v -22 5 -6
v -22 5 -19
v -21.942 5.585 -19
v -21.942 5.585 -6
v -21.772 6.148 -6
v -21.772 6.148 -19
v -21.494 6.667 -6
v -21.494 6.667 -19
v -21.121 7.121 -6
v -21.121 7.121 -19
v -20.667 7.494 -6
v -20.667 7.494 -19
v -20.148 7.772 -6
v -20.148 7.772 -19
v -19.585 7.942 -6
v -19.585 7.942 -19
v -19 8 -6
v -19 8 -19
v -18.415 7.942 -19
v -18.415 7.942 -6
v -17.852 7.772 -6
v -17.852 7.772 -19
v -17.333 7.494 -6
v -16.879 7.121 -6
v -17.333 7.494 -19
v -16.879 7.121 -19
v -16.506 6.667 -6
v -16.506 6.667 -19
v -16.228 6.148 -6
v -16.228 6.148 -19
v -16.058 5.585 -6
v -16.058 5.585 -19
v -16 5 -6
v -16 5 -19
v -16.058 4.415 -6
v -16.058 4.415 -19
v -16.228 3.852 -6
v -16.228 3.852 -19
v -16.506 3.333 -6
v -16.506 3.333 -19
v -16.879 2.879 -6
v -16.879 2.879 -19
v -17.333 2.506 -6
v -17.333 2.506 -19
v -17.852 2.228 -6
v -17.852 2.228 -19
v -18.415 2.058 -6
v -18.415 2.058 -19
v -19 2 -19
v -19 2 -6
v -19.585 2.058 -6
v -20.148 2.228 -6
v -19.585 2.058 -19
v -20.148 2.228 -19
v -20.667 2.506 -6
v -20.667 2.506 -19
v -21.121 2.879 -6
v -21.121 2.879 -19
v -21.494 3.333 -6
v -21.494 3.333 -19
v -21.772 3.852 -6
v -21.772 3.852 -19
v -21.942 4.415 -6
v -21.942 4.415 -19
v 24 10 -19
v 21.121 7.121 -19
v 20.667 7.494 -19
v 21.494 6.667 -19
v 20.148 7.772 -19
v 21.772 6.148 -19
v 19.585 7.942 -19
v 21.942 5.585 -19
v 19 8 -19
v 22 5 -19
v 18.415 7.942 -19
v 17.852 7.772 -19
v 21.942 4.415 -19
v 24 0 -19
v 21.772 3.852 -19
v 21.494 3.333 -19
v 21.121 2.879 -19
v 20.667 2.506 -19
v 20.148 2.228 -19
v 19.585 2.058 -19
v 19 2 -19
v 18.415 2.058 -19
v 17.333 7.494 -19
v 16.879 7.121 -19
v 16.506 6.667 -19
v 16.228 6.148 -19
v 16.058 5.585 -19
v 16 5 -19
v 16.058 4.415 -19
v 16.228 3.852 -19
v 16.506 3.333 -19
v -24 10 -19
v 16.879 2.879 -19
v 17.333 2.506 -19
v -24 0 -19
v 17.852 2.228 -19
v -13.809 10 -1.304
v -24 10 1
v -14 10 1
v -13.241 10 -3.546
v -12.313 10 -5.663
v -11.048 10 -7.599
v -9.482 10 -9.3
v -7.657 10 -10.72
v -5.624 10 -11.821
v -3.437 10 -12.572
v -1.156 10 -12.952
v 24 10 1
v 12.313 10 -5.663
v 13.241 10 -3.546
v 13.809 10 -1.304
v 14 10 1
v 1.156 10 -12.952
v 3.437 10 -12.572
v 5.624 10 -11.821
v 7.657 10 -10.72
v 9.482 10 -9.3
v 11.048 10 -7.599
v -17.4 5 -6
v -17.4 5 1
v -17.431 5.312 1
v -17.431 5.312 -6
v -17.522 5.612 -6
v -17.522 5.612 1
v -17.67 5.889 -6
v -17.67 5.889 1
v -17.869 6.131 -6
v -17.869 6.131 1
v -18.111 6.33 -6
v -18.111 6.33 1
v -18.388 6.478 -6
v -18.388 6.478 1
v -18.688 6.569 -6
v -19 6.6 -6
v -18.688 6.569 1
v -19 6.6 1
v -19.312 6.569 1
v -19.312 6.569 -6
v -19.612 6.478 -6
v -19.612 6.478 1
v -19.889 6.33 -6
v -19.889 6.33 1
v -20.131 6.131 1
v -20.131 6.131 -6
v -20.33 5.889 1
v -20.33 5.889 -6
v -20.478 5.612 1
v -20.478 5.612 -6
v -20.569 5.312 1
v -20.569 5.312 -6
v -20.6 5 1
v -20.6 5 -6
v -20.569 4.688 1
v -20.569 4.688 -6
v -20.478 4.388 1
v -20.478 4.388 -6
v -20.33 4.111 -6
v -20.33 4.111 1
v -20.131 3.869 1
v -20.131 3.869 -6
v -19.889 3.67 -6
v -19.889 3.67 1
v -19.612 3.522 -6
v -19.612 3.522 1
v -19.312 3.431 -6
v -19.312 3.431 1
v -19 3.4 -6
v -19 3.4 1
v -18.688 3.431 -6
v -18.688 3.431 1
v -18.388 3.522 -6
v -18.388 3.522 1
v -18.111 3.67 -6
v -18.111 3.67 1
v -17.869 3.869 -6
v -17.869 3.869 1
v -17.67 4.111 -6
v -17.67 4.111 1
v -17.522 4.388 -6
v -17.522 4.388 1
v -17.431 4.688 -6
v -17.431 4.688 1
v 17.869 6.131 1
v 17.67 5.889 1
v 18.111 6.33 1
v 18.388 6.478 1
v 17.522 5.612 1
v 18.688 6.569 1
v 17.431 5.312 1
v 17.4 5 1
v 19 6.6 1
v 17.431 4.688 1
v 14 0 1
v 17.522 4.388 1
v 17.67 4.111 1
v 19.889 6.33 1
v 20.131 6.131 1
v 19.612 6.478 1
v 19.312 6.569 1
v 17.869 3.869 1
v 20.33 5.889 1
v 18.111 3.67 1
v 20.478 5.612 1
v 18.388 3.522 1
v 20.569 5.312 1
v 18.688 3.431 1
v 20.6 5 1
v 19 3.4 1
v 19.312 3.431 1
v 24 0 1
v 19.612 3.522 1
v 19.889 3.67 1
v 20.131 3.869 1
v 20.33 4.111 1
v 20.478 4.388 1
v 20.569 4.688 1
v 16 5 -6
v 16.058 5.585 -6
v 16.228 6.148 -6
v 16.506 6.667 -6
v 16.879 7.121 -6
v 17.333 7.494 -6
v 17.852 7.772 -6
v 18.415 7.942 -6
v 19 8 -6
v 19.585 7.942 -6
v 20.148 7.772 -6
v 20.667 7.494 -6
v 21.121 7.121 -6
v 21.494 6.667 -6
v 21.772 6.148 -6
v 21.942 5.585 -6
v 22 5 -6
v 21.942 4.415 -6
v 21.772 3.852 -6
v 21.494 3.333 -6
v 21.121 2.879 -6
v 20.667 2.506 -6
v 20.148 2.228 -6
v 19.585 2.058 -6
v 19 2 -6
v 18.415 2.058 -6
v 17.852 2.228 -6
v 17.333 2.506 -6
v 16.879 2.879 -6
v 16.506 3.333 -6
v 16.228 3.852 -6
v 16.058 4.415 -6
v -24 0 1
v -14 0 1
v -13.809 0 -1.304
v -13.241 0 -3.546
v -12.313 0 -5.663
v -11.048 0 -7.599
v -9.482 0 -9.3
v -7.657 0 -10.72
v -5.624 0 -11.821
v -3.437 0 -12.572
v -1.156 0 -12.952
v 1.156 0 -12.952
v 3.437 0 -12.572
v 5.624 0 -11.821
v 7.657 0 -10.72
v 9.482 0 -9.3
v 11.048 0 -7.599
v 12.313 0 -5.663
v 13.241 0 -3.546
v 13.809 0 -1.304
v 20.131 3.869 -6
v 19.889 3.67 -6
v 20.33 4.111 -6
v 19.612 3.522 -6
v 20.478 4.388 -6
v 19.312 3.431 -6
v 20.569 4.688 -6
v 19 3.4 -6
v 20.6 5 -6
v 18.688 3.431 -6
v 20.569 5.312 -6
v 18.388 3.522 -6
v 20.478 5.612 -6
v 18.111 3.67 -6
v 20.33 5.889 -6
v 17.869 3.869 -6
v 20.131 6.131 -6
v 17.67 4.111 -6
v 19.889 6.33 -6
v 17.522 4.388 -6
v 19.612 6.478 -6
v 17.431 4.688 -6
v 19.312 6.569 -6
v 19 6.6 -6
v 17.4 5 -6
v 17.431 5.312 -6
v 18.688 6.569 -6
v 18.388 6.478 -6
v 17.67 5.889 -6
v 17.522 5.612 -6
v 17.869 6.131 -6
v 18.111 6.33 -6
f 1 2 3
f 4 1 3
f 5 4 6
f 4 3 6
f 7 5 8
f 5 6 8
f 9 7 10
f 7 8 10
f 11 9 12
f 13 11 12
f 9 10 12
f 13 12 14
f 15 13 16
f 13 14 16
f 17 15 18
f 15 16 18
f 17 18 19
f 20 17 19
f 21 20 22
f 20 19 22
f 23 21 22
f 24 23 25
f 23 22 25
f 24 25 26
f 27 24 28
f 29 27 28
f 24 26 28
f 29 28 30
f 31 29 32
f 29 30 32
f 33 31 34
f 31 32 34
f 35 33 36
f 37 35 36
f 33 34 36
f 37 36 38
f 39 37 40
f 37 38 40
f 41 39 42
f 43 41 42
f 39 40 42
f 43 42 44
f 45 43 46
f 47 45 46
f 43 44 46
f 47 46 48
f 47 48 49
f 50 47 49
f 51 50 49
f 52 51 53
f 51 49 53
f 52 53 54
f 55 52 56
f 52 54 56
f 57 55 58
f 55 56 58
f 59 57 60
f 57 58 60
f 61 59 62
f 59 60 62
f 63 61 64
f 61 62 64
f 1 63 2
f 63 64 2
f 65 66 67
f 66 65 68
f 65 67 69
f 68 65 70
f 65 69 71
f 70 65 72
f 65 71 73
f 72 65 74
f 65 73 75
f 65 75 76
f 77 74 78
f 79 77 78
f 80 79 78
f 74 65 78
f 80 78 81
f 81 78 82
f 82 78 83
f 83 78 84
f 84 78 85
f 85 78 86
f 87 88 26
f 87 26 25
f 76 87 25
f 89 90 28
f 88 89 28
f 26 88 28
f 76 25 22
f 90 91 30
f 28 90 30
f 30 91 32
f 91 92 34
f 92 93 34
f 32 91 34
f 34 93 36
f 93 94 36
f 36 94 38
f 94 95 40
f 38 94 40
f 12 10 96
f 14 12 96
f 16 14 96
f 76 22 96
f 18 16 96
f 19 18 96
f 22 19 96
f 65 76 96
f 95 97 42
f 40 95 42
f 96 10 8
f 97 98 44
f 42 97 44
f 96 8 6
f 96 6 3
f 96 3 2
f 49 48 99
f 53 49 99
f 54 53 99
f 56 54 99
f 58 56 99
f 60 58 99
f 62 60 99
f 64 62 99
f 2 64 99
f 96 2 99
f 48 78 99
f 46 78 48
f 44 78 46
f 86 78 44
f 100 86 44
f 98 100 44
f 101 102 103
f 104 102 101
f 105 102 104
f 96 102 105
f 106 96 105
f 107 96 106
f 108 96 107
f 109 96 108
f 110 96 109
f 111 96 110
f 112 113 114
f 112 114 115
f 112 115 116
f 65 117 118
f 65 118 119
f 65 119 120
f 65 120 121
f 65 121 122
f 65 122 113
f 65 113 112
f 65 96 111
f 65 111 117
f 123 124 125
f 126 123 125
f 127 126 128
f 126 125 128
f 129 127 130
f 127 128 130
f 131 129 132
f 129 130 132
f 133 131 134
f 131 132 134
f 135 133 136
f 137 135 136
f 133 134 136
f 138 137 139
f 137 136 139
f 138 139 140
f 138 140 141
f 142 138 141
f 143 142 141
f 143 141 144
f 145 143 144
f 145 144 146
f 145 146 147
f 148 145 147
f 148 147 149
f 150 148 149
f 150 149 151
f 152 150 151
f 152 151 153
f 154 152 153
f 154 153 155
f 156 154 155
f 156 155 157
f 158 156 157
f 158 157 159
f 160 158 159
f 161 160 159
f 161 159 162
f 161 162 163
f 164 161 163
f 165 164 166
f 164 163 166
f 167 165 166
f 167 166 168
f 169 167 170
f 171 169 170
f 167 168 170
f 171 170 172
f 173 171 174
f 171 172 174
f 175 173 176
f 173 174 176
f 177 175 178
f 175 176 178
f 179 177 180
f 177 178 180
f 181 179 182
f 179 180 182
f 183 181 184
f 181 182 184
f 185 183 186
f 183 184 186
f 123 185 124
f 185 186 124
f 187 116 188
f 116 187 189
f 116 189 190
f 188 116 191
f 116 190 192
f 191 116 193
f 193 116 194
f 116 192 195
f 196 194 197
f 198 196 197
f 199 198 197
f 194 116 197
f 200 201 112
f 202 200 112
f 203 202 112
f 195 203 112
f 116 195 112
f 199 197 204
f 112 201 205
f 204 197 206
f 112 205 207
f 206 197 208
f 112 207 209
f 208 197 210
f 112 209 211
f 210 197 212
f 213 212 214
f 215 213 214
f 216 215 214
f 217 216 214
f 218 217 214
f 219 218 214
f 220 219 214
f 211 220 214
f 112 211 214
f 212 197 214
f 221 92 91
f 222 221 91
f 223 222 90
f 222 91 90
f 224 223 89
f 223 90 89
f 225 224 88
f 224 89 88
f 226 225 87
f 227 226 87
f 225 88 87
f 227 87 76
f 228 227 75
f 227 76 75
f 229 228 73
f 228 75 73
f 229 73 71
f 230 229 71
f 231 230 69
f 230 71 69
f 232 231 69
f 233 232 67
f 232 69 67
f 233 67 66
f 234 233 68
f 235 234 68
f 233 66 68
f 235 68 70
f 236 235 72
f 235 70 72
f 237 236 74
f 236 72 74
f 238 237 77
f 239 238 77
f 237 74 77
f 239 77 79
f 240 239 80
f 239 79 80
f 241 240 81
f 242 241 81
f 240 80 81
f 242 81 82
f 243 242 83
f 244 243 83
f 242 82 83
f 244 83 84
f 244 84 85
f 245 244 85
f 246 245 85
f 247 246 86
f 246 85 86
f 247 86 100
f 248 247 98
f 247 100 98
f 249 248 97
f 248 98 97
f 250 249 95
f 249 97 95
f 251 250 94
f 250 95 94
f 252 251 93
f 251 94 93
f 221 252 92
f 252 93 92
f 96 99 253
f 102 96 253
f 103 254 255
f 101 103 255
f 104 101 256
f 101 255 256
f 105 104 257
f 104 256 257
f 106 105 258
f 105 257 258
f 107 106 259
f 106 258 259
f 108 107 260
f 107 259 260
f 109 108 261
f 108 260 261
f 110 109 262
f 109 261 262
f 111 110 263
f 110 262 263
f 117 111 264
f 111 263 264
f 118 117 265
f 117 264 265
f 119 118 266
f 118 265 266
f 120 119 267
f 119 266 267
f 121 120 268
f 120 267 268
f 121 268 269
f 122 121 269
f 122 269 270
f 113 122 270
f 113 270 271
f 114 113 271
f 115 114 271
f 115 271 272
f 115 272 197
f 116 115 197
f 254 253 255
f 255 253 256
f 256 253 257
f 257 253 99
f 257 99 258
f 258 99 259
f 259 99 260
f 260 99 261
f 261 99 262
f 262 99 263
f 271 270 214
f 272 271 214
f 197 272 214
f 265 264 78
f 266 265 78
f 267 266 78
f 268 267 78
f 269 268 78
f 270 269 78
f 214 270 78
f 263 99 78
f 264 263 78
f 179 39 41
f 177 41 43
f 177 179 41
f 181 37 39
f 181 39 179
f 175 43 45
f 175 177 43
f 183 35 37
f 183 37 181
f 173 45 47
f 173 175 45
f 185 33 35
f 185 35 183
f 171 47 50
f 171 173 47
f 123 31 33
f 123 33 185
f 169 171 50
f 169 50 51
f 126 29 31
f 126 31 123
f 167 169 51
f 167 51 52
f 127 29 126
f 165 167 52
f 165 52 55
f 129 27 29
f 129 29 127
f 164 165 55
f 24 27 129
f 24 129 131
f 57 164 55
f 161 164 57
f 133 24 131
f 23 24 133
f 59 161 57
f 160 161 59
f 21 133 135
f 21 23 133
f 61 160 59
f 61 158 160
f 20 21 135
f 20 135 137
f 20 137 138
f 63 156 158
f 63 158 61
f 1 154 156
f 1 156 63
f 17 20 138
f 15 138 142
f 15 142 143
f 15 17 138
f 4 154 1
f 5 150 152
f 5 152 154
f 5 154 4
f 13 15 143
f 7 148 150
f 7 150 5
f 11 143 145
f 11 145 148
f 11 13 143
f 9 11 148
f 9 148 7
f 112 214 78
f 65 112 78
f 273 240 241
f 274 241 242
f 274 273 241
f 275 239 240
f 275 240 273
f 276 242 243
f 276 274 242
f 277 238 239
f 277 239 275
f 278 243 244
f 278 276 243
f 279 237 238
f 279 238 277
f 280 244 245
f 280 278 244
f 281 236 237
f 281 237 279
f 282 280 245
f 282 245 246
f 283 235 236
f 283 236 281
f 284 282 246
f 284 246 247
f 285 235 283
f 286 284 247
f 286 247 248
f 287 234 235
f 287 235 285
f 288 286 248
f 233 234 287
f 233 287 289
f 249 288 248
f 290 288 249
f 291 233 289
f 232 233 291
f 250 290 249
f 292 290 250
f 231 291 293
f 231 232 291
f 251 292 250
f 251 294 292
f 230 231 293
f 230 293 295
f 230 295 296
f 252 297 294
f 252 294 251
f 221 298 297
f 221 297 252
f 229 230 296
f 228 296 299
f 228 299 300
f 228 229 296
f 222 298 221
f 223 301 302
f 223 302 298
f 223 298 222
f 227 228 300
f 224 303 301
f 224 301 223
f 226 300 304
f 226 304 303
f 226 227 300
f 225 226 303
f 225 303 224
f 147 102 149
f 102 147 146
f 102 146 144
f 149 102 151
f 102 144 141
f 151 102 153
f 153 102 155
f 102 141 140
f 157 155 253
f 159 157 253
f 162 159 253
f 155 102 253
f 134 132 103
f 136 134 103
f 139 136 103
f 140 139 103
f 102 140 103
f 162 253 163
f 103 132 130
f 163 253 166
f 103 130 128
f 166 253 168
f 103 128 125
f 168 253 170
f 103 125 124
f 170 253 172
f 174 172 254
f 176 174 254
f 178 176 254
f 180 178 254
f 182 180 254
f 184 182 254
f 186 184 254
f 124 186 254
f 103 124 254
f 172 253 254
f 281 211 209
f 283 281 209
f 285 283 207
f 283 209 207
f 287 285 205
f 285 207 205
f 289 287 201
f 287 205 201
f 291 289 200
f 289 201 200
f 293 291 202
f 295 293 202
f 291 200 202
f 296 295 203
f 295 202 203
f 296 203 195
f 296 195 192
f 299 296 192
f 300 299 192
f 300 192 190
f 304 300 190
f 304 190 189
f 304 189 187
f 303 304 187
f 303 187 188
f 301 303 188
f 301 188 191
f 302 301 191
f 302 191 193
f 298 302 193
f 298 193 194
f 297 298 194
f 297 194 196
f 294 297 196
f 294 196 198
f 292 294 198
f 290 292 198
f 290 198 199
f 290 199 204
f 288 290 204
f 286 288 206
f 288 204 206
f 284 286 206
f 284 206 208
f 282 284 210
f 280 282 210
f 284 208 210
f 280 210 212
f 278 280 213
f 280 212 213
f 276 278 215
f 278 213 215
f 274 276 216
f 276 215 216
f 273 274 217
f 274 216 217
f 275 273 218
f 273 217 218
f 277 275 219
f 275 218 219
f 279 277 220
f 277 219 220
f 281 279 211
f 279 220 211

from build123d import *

# Parameters (mm, degrees)
AUFSATZ_LINEAR_AUSTRAGEN1_DEPTH = 10
SKIZZE2_R                       = 1.6
SCHNITT_LINEAR_AUSTRAGEN1_DEPTH = 21
SKIZZE3_R                       = 3
SCHNITT_LINEAR_AUSTRAGEN2_DEPTH = 13


with BuildPart() as part:
    # Skizze1 → Aufsatz-Linear austragen1 (new body)
    with BuildSketch(Plane(origin=(0, 0, 0), x_dir=(1, 0, 0), z_dir=(0, 1, 0))):
        with BuildLine():
            Line((14, -1), (24, -1))
            Line((24, -1), (24, 19))
            Line((24, 19), (-24, 19))
            Line((-24, 19), (-24, -1))
            Line((-24, -1), (-14, -1))
            ThreePointArc((-14, -1), (0, 13), (14, -1))
        make_face()
    extrude(amount=AUFSATZ_LINEAR_AUSTRAGEN1_DEPTH)

    # Skizze2 → Schnitt-Linear austragen1 (cut, through all)
    with BuildSketch(Plane.XY.offset(1)):
        with Locations((-19, 5)):
            Circle(SKIZZE2_R)
        with Locations((19, 5)):
            Circle(SKIZZE2_R)
    extrude(amount=-SCHNITT_LINEAR_AUSTRAGEN1_DEPTH, mode=Mode.SUBTRACT)

    # Skizze3 → Schnitt-Linear austragen2 (cut)
    with BuildSketch(Plane(origin=(0, 0, -19), x_dir=(-1, 0, 0), z_dir=(0, 0, -1))):
        with Locations((-19, 5)):
            Circle(SKIZZE3_R)
        with Locations((19, 5)):
            Circle(SKIZZE3_R)
    extrude(amount=-SCHNITT_LINEAR_AUSTRAGEN2_DEPTH, mode=Mode.SUBTRACT)


solid = part.part
